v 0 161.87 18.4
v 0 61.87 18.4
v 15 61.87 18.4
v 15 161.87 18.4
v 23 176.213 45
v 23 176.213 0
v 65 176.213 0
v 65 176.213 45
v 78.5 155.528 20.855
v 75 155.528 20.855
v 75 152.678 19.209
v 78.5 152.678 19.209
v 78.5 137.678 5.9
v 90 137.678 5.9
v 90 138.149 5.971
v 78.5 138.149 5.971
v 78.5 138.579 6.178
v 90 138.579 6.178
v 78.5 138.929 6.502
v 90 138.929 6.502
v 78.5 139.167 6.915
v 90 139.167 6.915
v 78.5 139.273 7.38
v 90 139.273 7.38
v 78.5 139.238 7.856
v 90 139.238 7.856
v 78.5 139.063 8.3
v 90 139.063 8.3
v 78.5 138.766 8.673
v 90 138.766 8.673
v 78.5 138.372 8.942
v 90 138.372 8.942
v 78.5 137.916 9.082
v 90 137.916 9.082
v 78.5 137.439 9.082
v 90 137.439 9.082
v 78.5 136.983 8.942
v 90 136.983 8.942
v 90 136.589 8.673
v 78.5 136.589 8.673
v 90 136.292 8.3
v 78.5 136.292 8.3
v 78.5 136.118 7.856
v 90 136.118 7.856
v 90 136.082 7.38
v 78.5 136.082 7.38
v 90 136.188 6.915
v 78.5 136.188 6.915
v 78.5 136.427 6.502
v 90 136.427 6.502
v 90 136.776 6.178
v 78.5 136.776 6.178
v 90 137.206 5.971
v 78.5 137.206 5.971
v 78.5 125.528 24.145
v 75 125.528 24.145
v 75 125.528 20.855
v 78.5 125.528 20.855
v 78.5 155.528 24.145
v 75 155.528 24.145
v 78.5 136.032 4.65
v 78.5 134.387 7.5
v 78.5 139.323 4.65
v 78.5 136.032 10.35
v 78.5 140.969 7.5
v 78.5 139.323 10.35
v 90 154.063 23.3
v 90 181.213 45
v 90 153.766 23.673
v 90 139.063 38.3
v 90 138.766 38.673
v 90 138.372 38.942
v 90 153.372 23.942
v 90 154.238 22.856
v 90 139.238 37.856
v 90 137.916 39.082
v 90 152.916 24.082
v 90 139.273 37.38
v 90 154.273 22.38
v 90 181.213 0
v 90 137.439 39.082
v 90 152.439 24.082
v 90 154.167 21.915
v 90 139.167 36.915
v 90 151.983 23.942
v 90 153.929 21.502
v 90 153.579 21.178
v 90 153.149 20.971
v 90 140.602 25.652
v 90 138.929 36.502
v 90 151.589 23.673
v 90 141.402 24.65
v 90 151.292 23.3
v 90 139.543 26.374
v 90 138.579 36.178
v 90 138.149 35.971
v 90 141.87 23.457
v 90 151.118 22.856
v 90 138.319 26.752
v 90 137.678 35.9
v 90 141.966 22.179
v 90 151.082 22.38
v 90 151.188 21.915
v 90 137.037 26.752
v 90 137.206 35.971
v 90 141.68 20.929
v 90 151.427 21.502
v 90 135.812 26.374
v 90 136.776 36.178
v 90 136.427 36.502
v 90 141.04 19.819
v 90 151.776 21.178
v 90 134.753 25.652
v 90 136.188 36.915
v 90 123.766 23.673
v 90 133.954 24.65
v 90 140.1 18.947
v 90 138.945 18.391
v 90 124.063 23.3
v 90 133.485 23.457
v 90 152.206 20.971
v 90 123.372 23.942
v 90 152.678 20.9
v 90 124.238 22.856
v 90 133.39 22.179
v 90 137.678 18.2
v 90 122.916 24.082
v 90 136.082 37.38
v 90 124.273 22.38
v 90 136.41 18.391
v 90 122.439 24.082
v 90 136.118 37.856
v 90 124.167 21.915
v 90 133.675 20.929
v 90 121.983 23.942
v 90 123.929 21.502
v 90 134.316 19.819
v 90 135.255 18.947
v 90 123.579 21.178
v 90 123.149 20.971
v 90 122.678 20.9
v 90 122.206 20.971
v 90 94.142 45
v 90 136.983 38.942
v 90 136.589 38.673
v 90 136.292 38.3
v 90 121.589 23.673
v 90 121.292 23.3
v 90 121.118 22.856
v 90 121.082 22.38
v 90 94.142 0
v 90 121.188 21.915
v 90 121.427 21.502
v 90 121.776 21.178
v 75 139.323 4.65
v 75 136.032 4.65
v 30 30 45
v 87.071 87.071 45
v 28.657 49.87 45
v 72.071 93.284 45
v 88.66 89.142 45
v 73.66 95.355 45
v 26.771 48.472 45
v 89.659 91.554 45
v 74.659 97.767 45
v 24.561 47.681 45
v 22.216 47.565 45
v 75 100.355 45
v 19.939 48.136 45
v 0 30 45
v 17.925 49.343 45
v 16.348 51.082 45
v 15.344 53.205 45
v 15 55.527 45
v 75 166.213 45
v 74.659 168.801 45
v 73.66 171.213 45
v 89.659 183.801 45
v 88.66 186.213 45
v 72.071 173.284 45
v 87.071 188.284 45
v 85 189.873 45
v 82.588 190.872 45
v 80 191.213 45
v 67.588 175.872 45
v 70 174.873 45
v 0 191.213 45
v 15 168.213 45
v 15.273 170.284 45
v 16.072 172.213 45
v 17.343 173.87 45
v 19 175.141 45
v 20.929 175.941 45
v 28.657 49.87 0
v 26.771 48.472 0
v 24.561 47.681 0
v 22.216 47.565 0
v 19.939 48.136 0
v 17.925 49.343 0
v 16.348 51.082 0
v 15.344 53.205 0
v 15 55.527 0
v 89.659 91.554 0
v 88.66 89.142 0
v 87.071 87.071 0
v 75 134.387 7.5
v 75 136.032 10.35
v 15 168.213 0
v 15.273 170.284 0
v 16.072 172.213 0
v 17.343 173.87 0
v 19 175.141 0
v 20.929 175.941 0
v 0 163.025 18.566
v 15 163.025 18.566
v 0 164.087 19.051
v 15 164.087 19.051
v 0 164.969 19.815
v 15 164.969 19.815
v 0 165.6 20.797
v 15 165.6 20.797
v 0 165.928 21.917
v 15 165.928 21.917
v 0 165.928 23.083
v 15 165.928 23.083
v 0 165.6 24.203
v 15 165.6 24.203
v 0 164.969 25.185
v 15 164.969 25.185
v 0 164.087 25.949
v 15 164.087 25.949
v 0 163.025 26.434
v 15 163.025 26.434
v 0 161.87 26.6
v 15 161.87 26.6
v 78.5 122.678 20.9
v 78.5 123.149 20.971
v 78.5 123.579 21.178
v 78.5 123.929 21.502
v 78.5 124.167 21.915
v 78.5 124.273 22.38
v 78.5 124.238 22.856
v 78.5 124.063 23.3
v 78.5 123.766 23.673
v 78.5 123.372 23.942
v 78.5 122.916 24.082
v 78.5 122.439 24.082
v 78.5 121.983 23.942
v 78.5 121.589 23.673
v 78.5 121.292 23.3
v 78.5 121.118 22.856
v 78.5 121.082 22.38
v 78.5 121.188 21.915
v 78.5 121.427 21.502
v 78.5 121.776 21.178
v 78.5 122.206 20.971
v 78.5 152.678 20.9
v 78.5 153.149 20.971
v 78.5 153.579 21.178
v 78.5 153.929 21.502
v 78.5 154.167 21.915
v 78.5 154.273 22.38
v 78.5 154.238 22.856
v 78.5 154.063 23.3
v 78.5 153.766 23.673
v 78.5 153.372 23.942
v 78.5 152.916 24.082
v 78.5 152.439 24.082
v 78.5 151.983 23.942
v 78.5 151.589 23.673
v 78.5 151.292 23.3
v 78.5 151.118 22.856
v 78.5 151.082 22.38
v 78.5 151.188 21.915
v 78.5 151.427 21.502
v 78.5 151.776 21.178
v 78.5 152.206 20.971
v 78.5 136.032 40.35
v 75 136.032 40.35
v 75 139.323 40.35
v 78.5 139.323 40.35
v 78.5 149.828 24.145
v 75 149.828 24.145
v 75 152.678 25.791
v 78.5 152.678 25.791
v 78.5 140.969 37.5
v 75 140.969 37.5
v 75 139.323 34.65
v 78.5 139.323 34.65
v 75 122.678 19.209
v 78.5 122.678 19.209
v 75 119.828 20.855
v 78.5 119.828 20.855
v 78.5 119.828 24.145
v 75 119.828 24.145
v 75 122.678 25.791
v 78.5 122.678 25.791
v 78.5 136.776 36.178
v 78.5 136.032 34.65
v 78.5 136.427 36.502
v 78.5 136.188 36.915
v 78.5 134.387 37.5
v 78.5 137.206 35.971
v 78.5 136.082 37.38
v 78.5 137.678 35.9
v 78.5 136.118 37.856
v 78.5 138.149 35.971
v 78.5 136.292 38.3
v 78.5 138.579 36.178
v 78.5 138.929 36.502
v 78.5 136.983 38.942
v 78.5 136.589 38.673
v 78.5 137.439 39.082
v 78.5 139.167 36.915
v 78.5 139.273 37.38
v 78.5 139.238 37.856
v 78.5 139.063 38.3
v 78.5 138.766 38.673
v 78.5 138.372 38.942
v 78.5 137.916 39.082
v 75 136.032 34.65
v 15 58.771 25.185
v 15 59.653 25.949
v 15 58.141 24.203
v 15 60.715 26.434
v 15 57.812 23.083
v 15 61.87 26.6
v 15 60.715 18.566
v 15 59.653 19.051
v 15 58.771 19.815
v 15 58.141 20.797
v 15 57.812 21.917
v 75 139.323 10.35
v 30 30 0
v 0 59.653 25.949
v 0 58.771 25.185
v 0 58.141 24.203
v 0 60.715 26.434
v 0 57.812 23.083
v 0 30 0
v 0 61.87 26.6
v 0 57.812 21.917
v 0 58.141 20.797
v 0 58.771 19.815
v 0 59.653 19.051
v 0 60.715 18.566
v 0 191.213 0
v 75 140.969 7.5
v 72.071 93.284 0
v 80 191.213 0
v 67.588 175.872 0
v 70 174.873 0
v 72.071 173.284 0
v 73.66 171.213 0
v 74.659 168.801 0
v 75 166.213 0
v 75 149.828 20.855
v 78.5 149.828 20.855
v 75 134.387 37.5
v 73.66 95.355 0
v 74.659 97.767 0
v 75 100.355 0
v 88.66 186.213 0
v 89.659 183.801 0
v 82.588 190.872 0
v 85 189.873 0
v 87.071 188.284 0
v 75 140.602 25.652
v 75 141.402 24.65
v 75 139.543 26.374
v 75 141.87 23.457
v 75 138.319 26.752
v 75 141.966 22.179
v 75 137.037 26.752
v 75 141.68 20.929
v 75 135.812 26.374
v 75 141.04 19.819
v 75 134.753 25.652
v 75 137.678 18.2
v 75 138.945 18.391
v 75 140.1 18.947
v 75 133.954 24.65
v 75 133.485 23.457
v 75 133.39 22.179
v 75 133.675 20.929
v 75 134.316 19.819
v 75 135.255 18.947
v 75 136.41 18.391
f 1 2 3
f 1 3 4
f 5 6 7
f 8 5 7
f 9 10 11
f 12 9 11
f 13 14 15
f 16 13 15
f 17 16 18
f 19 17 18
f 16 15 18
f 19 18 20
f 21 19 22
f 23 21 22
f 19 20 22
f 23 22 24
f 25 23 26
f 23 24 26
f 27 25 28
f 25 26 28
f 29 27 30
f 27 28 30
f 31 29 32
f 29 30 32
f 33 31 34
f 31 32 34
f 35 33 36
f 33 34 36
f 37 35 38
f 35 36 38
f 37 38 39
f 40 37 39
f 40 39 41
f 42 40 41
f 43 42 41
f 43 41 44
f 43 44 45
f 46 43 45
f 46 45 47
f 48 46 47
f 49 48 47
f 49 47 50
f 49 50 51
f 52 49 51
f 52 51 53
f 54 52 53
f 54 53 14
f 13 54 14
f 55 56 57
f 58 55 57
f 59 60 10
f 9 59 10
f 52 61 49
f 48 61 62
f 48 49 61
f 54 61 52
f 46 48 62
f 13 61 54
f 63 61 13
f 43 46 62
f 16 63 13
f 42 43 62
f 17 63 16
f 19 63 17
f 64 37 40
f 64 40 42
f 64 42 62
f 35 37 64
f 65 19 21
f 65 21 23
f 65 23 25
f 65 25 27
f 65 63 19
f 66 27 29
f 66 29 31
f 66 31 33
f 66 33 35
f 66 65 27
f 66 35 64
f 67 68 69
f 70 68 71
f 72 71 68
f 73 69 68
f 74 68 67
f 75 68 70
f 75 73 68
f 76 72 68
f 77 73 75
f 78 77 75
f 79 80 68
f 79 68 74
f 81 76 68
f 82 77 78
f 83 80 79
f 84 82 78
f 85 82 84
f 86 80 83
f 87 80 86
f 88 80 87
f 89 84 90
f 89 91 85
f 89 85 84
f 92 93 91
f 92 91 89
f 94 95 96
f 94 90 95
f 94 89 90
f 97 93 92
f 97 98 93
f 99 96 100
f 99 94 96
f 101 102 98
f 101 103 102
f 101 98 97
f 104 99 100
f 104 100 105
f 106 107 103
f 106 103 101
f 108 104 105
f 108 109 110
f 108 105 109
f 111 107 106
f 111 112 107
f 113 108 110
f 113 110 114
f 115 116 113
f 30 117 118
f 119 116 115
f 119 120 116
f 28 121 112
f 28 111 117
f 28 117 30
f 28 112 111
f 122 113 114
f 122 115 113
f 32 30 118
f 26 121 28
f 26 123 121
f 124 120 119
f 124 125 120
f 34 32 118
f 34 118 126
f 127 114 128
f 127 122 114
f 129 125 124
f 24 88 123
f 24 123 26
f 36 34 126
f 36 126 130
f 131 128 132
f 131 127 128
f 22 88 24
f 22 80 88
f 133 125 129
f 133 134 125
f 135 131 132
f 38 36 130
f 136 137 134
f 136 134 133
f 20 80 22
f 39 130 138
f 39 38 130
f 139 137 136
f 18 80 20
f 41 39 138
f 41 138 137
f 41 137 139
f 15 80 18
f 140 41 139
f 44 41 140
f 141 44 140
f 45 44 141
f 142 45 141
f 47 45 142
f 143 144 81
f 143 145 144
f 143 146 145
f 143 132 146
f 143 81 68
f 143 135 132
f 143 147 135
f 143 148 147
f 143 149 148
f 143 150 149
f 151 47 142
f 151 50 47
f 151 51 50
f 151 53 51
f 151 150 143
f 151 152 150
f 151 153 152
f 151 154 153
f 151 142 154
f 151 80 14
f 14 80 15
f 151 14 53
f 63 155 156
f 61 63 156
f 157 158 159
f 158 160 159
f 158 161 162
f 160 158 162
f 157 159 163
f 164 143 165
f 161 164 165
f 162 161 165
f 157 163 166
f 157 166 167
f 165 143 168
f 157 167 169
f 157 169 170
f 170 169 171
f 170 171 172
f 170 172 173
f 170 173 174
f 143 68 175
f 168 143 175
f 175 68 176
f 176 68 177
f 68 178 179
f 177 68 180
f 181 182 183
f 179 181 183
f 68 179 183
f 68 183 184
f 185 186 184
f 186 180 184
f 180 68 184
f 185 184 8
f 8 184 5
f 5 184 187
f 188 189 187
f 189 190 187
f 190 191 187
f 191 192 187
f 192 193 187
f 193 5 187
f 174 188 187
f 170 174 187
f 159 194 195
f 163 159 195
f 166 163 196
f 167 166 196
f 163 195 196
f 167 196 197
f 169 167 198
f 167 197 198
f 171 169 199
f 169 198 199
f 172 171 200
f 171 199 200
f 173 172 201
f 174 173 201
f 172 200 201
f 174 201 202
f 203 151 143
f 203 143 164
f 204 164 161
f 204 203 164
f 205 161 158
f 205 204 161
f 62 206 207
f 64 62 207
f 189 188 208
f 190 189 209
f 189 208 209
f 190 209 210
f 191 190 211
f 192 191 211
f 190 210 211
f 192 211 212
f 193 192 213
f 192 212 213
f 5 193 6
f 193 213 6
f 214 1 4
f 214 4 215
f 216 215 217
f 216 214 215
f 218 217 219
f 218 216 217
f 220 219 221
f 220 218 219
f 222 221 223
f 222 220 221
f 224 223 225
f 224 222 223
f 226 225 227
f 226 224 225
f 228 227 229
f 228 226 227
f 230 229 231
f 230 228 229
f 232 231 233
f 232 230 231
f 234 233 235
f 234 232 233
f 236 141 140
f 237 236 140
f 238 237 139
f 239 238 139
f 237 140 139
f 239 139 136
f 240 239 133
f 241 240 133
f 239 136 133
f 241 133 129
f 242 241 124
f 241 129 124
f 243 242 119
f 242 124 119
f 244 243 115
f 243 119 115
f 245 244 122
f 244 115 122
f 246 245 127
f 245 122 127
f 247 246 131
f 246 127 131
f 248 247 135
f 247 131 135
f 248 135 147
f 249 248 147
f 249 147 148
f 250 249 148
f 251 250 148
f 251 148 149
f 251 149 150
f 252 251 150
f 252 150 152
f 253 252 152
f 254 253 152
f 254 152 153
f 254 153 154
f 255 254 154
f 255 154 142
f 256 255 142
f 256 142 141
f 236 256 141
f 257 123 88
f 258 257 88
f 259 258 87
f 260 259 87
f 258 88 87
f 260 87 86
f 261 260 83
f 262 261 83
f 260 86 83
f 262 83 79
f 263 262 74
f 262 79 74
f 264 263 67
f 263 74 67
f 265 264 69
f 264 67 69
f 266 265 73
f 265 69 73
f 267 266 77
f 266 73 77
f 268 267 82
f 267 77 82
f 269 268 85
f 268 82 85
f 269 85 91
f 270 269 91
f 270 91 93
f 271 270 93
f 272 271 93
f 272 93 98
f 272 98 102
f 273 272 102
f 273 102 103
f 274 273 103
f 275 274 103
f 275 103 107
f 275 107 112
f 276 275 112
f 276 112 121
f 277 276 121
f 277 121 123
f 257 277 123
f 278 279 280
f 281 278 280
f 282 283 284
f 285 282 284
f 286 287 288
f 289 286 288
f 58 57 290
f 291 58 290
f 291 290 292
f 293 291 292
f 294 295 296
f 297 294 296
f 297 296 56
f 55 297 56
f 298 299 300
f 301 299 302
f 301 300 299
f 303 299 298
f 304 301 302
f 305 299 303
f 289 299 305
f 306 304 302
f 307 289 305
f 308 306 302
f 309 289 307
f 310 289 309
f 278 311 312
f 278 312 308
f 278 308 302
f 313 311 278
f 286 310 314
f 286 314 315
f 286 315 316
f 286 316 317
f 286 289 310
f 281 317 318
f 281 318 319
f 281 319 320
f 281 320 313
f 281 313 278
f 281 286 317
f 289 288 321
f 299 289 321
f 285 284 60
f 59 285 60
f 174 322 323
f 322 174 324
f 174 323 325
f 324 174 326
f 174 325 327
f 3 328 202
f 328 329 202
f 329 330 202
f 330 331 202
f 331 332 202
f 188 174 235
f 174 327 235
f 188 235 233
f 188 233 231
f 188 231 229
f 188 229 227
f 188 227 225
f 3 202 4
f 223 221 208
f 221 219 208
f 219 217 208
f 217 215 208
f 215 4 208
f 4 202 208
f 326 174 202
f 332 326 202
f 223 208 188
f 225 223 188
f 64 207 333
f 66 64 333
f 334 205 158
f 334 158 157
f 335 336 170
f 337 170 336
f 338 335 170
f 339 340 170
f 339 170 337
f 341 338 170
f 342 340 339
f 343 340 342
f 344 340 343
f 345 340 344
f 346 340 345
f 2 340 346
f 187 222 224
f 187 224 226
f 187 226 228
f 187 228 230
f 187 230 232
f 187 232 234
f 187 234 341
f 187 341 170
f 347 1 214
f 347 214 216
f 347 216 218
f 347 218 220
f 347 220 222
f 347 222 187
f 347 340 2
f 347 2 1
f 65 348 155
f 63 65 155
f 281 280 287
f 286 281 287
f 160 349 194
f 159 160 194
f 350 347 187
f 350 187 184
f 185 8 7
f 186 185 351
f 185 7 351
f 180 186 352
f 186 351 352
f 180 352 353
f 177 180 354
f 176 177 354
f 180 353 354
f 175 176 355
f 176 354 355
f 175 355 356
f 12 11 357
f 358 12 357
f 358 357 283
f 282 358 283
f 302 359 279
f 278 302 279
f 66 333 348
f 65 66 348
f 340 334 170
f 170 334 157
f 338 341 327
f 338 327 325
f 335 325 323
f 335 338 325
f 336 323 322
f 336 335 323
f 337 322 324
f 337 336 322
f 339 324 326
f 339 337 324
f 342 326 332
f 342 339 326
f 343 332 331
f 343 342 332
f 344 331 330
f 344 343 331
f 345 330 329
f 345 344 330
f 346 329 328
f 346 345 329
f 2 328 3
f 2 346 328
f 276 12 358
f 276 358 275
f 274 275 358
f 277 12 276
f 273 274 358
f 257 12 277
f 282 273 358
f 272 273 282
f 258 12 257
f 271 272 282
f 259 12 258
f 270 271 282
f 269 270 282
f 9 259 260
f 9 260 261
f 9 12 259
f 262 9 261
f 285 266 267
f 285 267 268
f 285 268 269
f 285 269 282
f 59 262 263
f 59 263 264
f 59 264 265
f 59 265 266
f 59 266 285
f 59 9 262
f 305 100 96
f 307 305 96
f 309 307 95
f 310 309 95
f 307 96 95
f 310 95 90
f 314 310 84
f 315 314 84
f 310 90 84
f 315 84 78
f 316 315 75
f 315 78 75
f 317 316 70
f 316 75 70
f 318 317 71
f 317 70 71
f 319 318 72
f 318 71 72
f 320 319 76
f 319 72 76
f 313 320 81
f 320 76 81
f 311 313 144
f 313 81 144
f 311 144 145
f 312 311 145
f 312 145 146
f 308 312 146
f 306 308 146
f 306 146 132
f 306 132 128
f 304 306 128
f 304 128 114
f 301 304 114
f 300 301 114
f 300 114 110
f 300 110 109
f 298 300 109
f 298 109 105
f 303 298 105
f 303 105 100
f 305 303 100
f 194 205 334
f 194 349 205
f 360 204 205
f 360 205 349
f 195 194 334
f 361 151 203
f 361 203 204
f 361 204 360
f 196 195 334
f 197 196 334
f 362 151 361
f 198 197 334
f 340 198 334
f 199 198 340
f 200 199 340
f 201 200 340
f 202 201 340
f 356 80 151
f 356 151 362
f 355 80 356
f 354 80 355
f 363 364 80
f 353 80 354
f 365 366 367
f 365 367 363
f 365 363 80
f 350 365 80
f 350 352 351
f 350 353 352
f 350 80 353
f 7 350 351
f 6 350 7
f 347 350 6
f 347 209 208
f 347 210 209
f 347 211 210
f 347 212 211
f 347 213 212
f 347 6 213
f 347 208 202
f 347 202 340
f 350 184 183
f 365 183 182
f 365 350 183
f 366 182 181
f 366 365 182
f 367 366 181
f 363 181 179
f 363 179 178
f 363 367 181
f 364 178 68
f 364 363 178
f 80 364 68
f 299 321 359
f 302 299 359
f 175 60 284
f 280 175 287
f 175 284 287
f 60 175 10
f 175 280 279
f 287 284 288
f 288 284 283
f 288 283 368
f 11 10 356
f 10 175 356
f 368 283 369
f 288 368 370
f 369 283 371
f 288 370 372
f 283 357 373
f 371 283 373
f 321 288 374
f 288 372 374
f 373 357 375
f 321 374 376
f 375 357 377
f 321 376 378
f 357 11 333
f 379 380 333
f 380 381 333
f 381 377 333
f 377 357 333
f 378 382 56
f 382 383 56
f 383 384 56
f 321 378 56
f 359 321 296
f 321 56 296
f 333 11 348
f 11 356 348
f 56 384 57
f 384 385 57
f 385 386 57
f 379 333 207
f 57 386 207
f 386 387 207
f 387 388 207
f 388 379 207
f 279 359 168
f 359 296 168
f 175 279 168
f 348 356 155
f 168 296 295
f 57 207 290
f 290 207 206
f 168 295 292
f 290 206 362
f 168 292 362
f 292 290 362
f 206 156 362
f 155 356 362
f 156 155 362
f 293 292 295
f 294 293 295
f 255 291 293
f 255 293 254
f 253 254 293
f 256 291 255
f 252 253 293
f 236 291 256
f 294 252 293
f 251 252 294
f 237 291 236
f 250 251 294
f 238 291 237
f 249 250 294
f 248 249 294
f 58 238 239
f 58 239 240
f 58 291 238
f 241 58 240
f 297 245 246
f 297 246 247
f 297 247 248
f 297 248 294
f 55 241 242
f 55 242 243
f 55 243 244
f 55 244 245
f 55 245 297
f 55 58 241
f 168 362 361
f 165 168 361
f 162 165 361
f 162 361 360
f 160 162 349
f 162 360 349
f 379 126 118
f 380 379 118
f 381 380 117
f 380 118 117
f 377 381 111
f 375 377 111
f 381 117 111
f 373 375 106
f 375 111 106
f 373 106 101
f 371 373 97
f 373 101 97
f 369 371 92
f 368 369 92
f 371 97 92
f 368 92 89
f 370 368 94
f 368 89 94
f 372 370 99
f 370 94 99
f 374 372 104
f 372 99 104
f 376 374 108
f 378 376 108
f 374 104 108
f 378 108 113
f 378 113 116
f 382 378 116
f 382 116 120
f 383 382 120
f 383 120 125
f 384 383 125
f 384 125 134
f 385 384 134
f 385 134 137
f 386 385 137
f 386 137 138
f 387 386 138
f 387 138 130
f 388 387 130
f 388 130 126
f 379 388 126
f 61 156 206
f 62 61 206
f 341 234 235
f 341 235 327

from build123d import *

# Parameters (mm, degrees)
BODY_DEPTH                             = 45
BOTTOM_TRIM_SIZE                       = 30
BOTTOM_TRIM_SIZE2                      = 42.426406871
FRONT_MOUNTING_HOLES_REACH             = 92
SKETCH2_R                              = 4.3
SKETCH2_R_2                            = 1.6
FRONT_MOUNTING_HOLES_COUNTERBORE_DEPTH = 3.5
BACK_MOUNTING_SLOT_REACH               = 92


with BuildPart() as part:
    # Sketch1 → Body (new body)
    with BuildSketch(Plane.XY):
        with BuildLine():
            Line((0, 0), (0, 191.213203436))
            Line((0, 191.213203436), (80, 191.213203436))
            ThreePointArc((80, 191.213203436), (87.071067812, 188.284271247), (90, 181.213203436))
            Line((90, 181.213203436), (90, 94.142135624))
            ThreePointArc((90, 94.142135624), (89.238795325, 90.3153013), (87.071067812, 87.071067812))
            Line((87.071067812, 87.071067812), (0, 0))
        make_face()
        with BuildLine():
            Line((72.071067812, 93.284271247), (28.656854249, 49.870057685))
            ThreePointArc((28.656854249, 49.870057685), (19.938532541, 48.135875674), (15, 55.526911935))
            Line((15, 55.526911935), (15, 168.213203436))
            ThreePointArc((15, 168.213203436), (17.343145751, 173.870057685), (23, 176.213203436))
            Line((23, 176.213203436), (65, 176.213203436))
            ThreePointArc((65, 176.213203436), (72.071067812, 173.284271247), (75, 166.213203436))
            Line((75, 166.213203436), (75, 100.355339059))
            ThreePointArc((75, 100.355339059), (74.238795325, 96.528504736), (72.071067812, 93.284271247))
        make_face(mode=Mode.SUBTRACT)
    extrude(amount=BODY_DEPTH)

    # Bottom Trim
    bottom_trim_edges = [part.edges().sort_by_distance(p)[0] for p in [
        (0, 0, 22.5),
    ]]
    bottom_trim_side = [part.faces().sort_by_distance(p)[0] for p in [
        (0, 95.606601718, 22.5),
    ]]
    chamfer(bottom_trim_edges, length=BOTTOM_TRIM_SIZE, length2=BOTTOM_TRIM_SIZE2, reference=bottom_trim_side[0])

    # Sketch2 → Front Mounting Holes (cut, up to next)
    with BuildSketch(Plane(origin=(90, 0, 0), x_dir=(0, 0, -1), z_dir=(1, 0, 0)), mode=Mode.PRIVATE) as front_mounting_holes_sk1:
        with Locations((-22.5, 137.67766953)):
            Circle(SKETCH2_R)
    front_mounting_holes_tool1 = extrude(front_mounting_holes_sk1.sketch, amount=-FRONT_MOUNTING_HOLES_REACH, mode=Mode.PRIVATE) & part.part
    add(front_mounting_holes_tool1.solids().sort_by_distance((90, 137.67767, 22.5))[0], mode=Mode.SUBTRACT)
    # Sketch2 → Front Mounting Holes (cut, up to next)
    with BuildSketch(Plane(origin=(90, 0, 0), x_dir=(0, 0, -1), z_dir=(1, 0, 0)), mode=Mode.PRIVATE) as front_mounting_holes_sk2:
        with Locations((-22.5, 152.67766953)):
            Circle(SKETCH2_R_2)
    front_mounting_holes_tool2 = extrude(front_mounting_holes_sk2.sketch, amount=-FRONT_MOUNTING_HOLES_REACH, mode=Mode.PRIVATE) & part.part
    add(front_mounting_holes_tool2.solids().sort_by_distance((90, 152.67767, 22.5))[0], mode=Mode.SUBTRACT)
    # Sketch2 → Front Mounting Holes (cut, up to next)
    with BuildSketch(Plane(origin=(90, 0, 0), x_dir=(0, 0, -1), z_dir=(1, 0, 0)), mode=Mode.PRIVATE) as front_mounting_holes_sk3:
        with Locations((-7.5, 137.67766953)):
            Circle(SKETCH2_R_2)
    front_mounting_holes_tool3 = extrude(front_mounting_holes_sk3.sketch, amount=-FRONT_MOUNTING_HOLES_REACH, mode=Mode.PRIVATE) & part.part
    add(front_mounting_holes_tool3.solids().sort_by_distance((90, 137.67767, 7.5))[0], mode=Mode.SUBTRACT)
    # Sketch2 → Front Mounting Holes (cut, up to next)
    with BuildSketch(Plane(origin=(90, 0, 0), x_dir=(0, 0, -1), z_dir=(1, 0, 0)), mode=Mode.PRIVATE) as front_mounting_holes_sk4:
        with Locations((-22.5, 122.67766953)):
            Circle(SKETCH2_R_2)
    front_mounting_holes_tool4 = extrude(front_mounting_holes_sk4.sketch, amount=-FRONT_MOUNTING_HOLES_REACH, mode=Mode.PRIVATE) & part.part
    add(front_mounting_holes_tool4.solids().sort_by_distance((90, 122.67767, 22.5))[0], mode=Mode.SUBTRACT)
    # Sketch2 → Front Mounting Holes (cut, up to next)
    with BuildSketch(Plane(origin=(90, 0, 0), x_dir=(0, 0, -1), z_dir=(1, 0, 0)), mode=Mode.PRIVATE) as front_mounting_holes_sk5:
        with Locations((-37.5, 137.67766953)):
            Circle(SKETCH2_R_2)
    front_mounting_holes_tool5 = extrude(front_mounting_holes_sk5.sketch, amount=-FRONT_MOUNTING_HOLES_REACH, mode=Mode.PRIVATE) & part.part
    add(front_mounting_holes_tool5.solids().sort_by_distance((90, 137.67767, 37.5))[0], mode=Mode.SUBTRACT)

    # Sketch3 → Front Mounting Holes Counterbore (cut)
    with BuildSketch(Plane.ZY.offset(-75)):
        Polygon((40.35, 136.032221262), (40.35, 139.323117797), (37.5, 140.968566064), (34.65, 139.323117797), (34.65, 136.032221262), (37.5, 134.386772995), align=None)
        Polygon((24.145448267, 155.52766953), (20.854551733, 155.52766953), (19.209103466, 152.67766953), (20.854551733, 149.82766953), (24.145448267, 149.82766953), (25.790896534, 152.67766953), align=None)
        Polygon((20.854551733, 119.82766953), (24.145448267, 119.82766953), (25.790896534, 122.67766953), (24.145448267, 125.52766953), (20.854551733, 125.52766953), (19.209103466, 122.67766953), align=None)
        Polygon((4.65, 139.323117797), (4.65, 136.032221262), (7.5, 134.386772995), (10.35, 136.032221262), (10.35, 139.323117797), (7.5, 140.968566064), align=None)
    extrude(amount=-FRONT_MOUNTING_HOLES_COUNTERBORE_DEPTH, mode=Mode.SUBTRACT)

    # Sketch4 → Back Mounting Slot (cut, up to next)
    with BuildSketch(Plane.ZY, mode=Mode.PRIVATE) as back_mounting_slot_sk1:
        with BuildLine():
            Line((26.6, 161.870057685), (26.6, 61.870057685))
            ThreePointArc((26.6, 61.870057685), (22.5, 57.770057685), (18.4, 61.870057685))
            Line((18.4, 61.870057685), (18.4, 161.870057685))
            ThreePointArc((18.4, 161.870057685), (22.5, 165.970057685), (26.6, 161.870057685))
        make_face()
    back_mounting_slot_tool1 = extrude(back_mounting_slot_sk1.sketch, amount=-BACK_MOUNTING_SLOT_REACH, mode=Mode.PRIVATE) & part.part
    add(back_mounting_slot_tool1.solids().sort_by_distance((0, 111.870058, 22.5))[0], mode=Mode.SUBTRACT)


solid = part.part
